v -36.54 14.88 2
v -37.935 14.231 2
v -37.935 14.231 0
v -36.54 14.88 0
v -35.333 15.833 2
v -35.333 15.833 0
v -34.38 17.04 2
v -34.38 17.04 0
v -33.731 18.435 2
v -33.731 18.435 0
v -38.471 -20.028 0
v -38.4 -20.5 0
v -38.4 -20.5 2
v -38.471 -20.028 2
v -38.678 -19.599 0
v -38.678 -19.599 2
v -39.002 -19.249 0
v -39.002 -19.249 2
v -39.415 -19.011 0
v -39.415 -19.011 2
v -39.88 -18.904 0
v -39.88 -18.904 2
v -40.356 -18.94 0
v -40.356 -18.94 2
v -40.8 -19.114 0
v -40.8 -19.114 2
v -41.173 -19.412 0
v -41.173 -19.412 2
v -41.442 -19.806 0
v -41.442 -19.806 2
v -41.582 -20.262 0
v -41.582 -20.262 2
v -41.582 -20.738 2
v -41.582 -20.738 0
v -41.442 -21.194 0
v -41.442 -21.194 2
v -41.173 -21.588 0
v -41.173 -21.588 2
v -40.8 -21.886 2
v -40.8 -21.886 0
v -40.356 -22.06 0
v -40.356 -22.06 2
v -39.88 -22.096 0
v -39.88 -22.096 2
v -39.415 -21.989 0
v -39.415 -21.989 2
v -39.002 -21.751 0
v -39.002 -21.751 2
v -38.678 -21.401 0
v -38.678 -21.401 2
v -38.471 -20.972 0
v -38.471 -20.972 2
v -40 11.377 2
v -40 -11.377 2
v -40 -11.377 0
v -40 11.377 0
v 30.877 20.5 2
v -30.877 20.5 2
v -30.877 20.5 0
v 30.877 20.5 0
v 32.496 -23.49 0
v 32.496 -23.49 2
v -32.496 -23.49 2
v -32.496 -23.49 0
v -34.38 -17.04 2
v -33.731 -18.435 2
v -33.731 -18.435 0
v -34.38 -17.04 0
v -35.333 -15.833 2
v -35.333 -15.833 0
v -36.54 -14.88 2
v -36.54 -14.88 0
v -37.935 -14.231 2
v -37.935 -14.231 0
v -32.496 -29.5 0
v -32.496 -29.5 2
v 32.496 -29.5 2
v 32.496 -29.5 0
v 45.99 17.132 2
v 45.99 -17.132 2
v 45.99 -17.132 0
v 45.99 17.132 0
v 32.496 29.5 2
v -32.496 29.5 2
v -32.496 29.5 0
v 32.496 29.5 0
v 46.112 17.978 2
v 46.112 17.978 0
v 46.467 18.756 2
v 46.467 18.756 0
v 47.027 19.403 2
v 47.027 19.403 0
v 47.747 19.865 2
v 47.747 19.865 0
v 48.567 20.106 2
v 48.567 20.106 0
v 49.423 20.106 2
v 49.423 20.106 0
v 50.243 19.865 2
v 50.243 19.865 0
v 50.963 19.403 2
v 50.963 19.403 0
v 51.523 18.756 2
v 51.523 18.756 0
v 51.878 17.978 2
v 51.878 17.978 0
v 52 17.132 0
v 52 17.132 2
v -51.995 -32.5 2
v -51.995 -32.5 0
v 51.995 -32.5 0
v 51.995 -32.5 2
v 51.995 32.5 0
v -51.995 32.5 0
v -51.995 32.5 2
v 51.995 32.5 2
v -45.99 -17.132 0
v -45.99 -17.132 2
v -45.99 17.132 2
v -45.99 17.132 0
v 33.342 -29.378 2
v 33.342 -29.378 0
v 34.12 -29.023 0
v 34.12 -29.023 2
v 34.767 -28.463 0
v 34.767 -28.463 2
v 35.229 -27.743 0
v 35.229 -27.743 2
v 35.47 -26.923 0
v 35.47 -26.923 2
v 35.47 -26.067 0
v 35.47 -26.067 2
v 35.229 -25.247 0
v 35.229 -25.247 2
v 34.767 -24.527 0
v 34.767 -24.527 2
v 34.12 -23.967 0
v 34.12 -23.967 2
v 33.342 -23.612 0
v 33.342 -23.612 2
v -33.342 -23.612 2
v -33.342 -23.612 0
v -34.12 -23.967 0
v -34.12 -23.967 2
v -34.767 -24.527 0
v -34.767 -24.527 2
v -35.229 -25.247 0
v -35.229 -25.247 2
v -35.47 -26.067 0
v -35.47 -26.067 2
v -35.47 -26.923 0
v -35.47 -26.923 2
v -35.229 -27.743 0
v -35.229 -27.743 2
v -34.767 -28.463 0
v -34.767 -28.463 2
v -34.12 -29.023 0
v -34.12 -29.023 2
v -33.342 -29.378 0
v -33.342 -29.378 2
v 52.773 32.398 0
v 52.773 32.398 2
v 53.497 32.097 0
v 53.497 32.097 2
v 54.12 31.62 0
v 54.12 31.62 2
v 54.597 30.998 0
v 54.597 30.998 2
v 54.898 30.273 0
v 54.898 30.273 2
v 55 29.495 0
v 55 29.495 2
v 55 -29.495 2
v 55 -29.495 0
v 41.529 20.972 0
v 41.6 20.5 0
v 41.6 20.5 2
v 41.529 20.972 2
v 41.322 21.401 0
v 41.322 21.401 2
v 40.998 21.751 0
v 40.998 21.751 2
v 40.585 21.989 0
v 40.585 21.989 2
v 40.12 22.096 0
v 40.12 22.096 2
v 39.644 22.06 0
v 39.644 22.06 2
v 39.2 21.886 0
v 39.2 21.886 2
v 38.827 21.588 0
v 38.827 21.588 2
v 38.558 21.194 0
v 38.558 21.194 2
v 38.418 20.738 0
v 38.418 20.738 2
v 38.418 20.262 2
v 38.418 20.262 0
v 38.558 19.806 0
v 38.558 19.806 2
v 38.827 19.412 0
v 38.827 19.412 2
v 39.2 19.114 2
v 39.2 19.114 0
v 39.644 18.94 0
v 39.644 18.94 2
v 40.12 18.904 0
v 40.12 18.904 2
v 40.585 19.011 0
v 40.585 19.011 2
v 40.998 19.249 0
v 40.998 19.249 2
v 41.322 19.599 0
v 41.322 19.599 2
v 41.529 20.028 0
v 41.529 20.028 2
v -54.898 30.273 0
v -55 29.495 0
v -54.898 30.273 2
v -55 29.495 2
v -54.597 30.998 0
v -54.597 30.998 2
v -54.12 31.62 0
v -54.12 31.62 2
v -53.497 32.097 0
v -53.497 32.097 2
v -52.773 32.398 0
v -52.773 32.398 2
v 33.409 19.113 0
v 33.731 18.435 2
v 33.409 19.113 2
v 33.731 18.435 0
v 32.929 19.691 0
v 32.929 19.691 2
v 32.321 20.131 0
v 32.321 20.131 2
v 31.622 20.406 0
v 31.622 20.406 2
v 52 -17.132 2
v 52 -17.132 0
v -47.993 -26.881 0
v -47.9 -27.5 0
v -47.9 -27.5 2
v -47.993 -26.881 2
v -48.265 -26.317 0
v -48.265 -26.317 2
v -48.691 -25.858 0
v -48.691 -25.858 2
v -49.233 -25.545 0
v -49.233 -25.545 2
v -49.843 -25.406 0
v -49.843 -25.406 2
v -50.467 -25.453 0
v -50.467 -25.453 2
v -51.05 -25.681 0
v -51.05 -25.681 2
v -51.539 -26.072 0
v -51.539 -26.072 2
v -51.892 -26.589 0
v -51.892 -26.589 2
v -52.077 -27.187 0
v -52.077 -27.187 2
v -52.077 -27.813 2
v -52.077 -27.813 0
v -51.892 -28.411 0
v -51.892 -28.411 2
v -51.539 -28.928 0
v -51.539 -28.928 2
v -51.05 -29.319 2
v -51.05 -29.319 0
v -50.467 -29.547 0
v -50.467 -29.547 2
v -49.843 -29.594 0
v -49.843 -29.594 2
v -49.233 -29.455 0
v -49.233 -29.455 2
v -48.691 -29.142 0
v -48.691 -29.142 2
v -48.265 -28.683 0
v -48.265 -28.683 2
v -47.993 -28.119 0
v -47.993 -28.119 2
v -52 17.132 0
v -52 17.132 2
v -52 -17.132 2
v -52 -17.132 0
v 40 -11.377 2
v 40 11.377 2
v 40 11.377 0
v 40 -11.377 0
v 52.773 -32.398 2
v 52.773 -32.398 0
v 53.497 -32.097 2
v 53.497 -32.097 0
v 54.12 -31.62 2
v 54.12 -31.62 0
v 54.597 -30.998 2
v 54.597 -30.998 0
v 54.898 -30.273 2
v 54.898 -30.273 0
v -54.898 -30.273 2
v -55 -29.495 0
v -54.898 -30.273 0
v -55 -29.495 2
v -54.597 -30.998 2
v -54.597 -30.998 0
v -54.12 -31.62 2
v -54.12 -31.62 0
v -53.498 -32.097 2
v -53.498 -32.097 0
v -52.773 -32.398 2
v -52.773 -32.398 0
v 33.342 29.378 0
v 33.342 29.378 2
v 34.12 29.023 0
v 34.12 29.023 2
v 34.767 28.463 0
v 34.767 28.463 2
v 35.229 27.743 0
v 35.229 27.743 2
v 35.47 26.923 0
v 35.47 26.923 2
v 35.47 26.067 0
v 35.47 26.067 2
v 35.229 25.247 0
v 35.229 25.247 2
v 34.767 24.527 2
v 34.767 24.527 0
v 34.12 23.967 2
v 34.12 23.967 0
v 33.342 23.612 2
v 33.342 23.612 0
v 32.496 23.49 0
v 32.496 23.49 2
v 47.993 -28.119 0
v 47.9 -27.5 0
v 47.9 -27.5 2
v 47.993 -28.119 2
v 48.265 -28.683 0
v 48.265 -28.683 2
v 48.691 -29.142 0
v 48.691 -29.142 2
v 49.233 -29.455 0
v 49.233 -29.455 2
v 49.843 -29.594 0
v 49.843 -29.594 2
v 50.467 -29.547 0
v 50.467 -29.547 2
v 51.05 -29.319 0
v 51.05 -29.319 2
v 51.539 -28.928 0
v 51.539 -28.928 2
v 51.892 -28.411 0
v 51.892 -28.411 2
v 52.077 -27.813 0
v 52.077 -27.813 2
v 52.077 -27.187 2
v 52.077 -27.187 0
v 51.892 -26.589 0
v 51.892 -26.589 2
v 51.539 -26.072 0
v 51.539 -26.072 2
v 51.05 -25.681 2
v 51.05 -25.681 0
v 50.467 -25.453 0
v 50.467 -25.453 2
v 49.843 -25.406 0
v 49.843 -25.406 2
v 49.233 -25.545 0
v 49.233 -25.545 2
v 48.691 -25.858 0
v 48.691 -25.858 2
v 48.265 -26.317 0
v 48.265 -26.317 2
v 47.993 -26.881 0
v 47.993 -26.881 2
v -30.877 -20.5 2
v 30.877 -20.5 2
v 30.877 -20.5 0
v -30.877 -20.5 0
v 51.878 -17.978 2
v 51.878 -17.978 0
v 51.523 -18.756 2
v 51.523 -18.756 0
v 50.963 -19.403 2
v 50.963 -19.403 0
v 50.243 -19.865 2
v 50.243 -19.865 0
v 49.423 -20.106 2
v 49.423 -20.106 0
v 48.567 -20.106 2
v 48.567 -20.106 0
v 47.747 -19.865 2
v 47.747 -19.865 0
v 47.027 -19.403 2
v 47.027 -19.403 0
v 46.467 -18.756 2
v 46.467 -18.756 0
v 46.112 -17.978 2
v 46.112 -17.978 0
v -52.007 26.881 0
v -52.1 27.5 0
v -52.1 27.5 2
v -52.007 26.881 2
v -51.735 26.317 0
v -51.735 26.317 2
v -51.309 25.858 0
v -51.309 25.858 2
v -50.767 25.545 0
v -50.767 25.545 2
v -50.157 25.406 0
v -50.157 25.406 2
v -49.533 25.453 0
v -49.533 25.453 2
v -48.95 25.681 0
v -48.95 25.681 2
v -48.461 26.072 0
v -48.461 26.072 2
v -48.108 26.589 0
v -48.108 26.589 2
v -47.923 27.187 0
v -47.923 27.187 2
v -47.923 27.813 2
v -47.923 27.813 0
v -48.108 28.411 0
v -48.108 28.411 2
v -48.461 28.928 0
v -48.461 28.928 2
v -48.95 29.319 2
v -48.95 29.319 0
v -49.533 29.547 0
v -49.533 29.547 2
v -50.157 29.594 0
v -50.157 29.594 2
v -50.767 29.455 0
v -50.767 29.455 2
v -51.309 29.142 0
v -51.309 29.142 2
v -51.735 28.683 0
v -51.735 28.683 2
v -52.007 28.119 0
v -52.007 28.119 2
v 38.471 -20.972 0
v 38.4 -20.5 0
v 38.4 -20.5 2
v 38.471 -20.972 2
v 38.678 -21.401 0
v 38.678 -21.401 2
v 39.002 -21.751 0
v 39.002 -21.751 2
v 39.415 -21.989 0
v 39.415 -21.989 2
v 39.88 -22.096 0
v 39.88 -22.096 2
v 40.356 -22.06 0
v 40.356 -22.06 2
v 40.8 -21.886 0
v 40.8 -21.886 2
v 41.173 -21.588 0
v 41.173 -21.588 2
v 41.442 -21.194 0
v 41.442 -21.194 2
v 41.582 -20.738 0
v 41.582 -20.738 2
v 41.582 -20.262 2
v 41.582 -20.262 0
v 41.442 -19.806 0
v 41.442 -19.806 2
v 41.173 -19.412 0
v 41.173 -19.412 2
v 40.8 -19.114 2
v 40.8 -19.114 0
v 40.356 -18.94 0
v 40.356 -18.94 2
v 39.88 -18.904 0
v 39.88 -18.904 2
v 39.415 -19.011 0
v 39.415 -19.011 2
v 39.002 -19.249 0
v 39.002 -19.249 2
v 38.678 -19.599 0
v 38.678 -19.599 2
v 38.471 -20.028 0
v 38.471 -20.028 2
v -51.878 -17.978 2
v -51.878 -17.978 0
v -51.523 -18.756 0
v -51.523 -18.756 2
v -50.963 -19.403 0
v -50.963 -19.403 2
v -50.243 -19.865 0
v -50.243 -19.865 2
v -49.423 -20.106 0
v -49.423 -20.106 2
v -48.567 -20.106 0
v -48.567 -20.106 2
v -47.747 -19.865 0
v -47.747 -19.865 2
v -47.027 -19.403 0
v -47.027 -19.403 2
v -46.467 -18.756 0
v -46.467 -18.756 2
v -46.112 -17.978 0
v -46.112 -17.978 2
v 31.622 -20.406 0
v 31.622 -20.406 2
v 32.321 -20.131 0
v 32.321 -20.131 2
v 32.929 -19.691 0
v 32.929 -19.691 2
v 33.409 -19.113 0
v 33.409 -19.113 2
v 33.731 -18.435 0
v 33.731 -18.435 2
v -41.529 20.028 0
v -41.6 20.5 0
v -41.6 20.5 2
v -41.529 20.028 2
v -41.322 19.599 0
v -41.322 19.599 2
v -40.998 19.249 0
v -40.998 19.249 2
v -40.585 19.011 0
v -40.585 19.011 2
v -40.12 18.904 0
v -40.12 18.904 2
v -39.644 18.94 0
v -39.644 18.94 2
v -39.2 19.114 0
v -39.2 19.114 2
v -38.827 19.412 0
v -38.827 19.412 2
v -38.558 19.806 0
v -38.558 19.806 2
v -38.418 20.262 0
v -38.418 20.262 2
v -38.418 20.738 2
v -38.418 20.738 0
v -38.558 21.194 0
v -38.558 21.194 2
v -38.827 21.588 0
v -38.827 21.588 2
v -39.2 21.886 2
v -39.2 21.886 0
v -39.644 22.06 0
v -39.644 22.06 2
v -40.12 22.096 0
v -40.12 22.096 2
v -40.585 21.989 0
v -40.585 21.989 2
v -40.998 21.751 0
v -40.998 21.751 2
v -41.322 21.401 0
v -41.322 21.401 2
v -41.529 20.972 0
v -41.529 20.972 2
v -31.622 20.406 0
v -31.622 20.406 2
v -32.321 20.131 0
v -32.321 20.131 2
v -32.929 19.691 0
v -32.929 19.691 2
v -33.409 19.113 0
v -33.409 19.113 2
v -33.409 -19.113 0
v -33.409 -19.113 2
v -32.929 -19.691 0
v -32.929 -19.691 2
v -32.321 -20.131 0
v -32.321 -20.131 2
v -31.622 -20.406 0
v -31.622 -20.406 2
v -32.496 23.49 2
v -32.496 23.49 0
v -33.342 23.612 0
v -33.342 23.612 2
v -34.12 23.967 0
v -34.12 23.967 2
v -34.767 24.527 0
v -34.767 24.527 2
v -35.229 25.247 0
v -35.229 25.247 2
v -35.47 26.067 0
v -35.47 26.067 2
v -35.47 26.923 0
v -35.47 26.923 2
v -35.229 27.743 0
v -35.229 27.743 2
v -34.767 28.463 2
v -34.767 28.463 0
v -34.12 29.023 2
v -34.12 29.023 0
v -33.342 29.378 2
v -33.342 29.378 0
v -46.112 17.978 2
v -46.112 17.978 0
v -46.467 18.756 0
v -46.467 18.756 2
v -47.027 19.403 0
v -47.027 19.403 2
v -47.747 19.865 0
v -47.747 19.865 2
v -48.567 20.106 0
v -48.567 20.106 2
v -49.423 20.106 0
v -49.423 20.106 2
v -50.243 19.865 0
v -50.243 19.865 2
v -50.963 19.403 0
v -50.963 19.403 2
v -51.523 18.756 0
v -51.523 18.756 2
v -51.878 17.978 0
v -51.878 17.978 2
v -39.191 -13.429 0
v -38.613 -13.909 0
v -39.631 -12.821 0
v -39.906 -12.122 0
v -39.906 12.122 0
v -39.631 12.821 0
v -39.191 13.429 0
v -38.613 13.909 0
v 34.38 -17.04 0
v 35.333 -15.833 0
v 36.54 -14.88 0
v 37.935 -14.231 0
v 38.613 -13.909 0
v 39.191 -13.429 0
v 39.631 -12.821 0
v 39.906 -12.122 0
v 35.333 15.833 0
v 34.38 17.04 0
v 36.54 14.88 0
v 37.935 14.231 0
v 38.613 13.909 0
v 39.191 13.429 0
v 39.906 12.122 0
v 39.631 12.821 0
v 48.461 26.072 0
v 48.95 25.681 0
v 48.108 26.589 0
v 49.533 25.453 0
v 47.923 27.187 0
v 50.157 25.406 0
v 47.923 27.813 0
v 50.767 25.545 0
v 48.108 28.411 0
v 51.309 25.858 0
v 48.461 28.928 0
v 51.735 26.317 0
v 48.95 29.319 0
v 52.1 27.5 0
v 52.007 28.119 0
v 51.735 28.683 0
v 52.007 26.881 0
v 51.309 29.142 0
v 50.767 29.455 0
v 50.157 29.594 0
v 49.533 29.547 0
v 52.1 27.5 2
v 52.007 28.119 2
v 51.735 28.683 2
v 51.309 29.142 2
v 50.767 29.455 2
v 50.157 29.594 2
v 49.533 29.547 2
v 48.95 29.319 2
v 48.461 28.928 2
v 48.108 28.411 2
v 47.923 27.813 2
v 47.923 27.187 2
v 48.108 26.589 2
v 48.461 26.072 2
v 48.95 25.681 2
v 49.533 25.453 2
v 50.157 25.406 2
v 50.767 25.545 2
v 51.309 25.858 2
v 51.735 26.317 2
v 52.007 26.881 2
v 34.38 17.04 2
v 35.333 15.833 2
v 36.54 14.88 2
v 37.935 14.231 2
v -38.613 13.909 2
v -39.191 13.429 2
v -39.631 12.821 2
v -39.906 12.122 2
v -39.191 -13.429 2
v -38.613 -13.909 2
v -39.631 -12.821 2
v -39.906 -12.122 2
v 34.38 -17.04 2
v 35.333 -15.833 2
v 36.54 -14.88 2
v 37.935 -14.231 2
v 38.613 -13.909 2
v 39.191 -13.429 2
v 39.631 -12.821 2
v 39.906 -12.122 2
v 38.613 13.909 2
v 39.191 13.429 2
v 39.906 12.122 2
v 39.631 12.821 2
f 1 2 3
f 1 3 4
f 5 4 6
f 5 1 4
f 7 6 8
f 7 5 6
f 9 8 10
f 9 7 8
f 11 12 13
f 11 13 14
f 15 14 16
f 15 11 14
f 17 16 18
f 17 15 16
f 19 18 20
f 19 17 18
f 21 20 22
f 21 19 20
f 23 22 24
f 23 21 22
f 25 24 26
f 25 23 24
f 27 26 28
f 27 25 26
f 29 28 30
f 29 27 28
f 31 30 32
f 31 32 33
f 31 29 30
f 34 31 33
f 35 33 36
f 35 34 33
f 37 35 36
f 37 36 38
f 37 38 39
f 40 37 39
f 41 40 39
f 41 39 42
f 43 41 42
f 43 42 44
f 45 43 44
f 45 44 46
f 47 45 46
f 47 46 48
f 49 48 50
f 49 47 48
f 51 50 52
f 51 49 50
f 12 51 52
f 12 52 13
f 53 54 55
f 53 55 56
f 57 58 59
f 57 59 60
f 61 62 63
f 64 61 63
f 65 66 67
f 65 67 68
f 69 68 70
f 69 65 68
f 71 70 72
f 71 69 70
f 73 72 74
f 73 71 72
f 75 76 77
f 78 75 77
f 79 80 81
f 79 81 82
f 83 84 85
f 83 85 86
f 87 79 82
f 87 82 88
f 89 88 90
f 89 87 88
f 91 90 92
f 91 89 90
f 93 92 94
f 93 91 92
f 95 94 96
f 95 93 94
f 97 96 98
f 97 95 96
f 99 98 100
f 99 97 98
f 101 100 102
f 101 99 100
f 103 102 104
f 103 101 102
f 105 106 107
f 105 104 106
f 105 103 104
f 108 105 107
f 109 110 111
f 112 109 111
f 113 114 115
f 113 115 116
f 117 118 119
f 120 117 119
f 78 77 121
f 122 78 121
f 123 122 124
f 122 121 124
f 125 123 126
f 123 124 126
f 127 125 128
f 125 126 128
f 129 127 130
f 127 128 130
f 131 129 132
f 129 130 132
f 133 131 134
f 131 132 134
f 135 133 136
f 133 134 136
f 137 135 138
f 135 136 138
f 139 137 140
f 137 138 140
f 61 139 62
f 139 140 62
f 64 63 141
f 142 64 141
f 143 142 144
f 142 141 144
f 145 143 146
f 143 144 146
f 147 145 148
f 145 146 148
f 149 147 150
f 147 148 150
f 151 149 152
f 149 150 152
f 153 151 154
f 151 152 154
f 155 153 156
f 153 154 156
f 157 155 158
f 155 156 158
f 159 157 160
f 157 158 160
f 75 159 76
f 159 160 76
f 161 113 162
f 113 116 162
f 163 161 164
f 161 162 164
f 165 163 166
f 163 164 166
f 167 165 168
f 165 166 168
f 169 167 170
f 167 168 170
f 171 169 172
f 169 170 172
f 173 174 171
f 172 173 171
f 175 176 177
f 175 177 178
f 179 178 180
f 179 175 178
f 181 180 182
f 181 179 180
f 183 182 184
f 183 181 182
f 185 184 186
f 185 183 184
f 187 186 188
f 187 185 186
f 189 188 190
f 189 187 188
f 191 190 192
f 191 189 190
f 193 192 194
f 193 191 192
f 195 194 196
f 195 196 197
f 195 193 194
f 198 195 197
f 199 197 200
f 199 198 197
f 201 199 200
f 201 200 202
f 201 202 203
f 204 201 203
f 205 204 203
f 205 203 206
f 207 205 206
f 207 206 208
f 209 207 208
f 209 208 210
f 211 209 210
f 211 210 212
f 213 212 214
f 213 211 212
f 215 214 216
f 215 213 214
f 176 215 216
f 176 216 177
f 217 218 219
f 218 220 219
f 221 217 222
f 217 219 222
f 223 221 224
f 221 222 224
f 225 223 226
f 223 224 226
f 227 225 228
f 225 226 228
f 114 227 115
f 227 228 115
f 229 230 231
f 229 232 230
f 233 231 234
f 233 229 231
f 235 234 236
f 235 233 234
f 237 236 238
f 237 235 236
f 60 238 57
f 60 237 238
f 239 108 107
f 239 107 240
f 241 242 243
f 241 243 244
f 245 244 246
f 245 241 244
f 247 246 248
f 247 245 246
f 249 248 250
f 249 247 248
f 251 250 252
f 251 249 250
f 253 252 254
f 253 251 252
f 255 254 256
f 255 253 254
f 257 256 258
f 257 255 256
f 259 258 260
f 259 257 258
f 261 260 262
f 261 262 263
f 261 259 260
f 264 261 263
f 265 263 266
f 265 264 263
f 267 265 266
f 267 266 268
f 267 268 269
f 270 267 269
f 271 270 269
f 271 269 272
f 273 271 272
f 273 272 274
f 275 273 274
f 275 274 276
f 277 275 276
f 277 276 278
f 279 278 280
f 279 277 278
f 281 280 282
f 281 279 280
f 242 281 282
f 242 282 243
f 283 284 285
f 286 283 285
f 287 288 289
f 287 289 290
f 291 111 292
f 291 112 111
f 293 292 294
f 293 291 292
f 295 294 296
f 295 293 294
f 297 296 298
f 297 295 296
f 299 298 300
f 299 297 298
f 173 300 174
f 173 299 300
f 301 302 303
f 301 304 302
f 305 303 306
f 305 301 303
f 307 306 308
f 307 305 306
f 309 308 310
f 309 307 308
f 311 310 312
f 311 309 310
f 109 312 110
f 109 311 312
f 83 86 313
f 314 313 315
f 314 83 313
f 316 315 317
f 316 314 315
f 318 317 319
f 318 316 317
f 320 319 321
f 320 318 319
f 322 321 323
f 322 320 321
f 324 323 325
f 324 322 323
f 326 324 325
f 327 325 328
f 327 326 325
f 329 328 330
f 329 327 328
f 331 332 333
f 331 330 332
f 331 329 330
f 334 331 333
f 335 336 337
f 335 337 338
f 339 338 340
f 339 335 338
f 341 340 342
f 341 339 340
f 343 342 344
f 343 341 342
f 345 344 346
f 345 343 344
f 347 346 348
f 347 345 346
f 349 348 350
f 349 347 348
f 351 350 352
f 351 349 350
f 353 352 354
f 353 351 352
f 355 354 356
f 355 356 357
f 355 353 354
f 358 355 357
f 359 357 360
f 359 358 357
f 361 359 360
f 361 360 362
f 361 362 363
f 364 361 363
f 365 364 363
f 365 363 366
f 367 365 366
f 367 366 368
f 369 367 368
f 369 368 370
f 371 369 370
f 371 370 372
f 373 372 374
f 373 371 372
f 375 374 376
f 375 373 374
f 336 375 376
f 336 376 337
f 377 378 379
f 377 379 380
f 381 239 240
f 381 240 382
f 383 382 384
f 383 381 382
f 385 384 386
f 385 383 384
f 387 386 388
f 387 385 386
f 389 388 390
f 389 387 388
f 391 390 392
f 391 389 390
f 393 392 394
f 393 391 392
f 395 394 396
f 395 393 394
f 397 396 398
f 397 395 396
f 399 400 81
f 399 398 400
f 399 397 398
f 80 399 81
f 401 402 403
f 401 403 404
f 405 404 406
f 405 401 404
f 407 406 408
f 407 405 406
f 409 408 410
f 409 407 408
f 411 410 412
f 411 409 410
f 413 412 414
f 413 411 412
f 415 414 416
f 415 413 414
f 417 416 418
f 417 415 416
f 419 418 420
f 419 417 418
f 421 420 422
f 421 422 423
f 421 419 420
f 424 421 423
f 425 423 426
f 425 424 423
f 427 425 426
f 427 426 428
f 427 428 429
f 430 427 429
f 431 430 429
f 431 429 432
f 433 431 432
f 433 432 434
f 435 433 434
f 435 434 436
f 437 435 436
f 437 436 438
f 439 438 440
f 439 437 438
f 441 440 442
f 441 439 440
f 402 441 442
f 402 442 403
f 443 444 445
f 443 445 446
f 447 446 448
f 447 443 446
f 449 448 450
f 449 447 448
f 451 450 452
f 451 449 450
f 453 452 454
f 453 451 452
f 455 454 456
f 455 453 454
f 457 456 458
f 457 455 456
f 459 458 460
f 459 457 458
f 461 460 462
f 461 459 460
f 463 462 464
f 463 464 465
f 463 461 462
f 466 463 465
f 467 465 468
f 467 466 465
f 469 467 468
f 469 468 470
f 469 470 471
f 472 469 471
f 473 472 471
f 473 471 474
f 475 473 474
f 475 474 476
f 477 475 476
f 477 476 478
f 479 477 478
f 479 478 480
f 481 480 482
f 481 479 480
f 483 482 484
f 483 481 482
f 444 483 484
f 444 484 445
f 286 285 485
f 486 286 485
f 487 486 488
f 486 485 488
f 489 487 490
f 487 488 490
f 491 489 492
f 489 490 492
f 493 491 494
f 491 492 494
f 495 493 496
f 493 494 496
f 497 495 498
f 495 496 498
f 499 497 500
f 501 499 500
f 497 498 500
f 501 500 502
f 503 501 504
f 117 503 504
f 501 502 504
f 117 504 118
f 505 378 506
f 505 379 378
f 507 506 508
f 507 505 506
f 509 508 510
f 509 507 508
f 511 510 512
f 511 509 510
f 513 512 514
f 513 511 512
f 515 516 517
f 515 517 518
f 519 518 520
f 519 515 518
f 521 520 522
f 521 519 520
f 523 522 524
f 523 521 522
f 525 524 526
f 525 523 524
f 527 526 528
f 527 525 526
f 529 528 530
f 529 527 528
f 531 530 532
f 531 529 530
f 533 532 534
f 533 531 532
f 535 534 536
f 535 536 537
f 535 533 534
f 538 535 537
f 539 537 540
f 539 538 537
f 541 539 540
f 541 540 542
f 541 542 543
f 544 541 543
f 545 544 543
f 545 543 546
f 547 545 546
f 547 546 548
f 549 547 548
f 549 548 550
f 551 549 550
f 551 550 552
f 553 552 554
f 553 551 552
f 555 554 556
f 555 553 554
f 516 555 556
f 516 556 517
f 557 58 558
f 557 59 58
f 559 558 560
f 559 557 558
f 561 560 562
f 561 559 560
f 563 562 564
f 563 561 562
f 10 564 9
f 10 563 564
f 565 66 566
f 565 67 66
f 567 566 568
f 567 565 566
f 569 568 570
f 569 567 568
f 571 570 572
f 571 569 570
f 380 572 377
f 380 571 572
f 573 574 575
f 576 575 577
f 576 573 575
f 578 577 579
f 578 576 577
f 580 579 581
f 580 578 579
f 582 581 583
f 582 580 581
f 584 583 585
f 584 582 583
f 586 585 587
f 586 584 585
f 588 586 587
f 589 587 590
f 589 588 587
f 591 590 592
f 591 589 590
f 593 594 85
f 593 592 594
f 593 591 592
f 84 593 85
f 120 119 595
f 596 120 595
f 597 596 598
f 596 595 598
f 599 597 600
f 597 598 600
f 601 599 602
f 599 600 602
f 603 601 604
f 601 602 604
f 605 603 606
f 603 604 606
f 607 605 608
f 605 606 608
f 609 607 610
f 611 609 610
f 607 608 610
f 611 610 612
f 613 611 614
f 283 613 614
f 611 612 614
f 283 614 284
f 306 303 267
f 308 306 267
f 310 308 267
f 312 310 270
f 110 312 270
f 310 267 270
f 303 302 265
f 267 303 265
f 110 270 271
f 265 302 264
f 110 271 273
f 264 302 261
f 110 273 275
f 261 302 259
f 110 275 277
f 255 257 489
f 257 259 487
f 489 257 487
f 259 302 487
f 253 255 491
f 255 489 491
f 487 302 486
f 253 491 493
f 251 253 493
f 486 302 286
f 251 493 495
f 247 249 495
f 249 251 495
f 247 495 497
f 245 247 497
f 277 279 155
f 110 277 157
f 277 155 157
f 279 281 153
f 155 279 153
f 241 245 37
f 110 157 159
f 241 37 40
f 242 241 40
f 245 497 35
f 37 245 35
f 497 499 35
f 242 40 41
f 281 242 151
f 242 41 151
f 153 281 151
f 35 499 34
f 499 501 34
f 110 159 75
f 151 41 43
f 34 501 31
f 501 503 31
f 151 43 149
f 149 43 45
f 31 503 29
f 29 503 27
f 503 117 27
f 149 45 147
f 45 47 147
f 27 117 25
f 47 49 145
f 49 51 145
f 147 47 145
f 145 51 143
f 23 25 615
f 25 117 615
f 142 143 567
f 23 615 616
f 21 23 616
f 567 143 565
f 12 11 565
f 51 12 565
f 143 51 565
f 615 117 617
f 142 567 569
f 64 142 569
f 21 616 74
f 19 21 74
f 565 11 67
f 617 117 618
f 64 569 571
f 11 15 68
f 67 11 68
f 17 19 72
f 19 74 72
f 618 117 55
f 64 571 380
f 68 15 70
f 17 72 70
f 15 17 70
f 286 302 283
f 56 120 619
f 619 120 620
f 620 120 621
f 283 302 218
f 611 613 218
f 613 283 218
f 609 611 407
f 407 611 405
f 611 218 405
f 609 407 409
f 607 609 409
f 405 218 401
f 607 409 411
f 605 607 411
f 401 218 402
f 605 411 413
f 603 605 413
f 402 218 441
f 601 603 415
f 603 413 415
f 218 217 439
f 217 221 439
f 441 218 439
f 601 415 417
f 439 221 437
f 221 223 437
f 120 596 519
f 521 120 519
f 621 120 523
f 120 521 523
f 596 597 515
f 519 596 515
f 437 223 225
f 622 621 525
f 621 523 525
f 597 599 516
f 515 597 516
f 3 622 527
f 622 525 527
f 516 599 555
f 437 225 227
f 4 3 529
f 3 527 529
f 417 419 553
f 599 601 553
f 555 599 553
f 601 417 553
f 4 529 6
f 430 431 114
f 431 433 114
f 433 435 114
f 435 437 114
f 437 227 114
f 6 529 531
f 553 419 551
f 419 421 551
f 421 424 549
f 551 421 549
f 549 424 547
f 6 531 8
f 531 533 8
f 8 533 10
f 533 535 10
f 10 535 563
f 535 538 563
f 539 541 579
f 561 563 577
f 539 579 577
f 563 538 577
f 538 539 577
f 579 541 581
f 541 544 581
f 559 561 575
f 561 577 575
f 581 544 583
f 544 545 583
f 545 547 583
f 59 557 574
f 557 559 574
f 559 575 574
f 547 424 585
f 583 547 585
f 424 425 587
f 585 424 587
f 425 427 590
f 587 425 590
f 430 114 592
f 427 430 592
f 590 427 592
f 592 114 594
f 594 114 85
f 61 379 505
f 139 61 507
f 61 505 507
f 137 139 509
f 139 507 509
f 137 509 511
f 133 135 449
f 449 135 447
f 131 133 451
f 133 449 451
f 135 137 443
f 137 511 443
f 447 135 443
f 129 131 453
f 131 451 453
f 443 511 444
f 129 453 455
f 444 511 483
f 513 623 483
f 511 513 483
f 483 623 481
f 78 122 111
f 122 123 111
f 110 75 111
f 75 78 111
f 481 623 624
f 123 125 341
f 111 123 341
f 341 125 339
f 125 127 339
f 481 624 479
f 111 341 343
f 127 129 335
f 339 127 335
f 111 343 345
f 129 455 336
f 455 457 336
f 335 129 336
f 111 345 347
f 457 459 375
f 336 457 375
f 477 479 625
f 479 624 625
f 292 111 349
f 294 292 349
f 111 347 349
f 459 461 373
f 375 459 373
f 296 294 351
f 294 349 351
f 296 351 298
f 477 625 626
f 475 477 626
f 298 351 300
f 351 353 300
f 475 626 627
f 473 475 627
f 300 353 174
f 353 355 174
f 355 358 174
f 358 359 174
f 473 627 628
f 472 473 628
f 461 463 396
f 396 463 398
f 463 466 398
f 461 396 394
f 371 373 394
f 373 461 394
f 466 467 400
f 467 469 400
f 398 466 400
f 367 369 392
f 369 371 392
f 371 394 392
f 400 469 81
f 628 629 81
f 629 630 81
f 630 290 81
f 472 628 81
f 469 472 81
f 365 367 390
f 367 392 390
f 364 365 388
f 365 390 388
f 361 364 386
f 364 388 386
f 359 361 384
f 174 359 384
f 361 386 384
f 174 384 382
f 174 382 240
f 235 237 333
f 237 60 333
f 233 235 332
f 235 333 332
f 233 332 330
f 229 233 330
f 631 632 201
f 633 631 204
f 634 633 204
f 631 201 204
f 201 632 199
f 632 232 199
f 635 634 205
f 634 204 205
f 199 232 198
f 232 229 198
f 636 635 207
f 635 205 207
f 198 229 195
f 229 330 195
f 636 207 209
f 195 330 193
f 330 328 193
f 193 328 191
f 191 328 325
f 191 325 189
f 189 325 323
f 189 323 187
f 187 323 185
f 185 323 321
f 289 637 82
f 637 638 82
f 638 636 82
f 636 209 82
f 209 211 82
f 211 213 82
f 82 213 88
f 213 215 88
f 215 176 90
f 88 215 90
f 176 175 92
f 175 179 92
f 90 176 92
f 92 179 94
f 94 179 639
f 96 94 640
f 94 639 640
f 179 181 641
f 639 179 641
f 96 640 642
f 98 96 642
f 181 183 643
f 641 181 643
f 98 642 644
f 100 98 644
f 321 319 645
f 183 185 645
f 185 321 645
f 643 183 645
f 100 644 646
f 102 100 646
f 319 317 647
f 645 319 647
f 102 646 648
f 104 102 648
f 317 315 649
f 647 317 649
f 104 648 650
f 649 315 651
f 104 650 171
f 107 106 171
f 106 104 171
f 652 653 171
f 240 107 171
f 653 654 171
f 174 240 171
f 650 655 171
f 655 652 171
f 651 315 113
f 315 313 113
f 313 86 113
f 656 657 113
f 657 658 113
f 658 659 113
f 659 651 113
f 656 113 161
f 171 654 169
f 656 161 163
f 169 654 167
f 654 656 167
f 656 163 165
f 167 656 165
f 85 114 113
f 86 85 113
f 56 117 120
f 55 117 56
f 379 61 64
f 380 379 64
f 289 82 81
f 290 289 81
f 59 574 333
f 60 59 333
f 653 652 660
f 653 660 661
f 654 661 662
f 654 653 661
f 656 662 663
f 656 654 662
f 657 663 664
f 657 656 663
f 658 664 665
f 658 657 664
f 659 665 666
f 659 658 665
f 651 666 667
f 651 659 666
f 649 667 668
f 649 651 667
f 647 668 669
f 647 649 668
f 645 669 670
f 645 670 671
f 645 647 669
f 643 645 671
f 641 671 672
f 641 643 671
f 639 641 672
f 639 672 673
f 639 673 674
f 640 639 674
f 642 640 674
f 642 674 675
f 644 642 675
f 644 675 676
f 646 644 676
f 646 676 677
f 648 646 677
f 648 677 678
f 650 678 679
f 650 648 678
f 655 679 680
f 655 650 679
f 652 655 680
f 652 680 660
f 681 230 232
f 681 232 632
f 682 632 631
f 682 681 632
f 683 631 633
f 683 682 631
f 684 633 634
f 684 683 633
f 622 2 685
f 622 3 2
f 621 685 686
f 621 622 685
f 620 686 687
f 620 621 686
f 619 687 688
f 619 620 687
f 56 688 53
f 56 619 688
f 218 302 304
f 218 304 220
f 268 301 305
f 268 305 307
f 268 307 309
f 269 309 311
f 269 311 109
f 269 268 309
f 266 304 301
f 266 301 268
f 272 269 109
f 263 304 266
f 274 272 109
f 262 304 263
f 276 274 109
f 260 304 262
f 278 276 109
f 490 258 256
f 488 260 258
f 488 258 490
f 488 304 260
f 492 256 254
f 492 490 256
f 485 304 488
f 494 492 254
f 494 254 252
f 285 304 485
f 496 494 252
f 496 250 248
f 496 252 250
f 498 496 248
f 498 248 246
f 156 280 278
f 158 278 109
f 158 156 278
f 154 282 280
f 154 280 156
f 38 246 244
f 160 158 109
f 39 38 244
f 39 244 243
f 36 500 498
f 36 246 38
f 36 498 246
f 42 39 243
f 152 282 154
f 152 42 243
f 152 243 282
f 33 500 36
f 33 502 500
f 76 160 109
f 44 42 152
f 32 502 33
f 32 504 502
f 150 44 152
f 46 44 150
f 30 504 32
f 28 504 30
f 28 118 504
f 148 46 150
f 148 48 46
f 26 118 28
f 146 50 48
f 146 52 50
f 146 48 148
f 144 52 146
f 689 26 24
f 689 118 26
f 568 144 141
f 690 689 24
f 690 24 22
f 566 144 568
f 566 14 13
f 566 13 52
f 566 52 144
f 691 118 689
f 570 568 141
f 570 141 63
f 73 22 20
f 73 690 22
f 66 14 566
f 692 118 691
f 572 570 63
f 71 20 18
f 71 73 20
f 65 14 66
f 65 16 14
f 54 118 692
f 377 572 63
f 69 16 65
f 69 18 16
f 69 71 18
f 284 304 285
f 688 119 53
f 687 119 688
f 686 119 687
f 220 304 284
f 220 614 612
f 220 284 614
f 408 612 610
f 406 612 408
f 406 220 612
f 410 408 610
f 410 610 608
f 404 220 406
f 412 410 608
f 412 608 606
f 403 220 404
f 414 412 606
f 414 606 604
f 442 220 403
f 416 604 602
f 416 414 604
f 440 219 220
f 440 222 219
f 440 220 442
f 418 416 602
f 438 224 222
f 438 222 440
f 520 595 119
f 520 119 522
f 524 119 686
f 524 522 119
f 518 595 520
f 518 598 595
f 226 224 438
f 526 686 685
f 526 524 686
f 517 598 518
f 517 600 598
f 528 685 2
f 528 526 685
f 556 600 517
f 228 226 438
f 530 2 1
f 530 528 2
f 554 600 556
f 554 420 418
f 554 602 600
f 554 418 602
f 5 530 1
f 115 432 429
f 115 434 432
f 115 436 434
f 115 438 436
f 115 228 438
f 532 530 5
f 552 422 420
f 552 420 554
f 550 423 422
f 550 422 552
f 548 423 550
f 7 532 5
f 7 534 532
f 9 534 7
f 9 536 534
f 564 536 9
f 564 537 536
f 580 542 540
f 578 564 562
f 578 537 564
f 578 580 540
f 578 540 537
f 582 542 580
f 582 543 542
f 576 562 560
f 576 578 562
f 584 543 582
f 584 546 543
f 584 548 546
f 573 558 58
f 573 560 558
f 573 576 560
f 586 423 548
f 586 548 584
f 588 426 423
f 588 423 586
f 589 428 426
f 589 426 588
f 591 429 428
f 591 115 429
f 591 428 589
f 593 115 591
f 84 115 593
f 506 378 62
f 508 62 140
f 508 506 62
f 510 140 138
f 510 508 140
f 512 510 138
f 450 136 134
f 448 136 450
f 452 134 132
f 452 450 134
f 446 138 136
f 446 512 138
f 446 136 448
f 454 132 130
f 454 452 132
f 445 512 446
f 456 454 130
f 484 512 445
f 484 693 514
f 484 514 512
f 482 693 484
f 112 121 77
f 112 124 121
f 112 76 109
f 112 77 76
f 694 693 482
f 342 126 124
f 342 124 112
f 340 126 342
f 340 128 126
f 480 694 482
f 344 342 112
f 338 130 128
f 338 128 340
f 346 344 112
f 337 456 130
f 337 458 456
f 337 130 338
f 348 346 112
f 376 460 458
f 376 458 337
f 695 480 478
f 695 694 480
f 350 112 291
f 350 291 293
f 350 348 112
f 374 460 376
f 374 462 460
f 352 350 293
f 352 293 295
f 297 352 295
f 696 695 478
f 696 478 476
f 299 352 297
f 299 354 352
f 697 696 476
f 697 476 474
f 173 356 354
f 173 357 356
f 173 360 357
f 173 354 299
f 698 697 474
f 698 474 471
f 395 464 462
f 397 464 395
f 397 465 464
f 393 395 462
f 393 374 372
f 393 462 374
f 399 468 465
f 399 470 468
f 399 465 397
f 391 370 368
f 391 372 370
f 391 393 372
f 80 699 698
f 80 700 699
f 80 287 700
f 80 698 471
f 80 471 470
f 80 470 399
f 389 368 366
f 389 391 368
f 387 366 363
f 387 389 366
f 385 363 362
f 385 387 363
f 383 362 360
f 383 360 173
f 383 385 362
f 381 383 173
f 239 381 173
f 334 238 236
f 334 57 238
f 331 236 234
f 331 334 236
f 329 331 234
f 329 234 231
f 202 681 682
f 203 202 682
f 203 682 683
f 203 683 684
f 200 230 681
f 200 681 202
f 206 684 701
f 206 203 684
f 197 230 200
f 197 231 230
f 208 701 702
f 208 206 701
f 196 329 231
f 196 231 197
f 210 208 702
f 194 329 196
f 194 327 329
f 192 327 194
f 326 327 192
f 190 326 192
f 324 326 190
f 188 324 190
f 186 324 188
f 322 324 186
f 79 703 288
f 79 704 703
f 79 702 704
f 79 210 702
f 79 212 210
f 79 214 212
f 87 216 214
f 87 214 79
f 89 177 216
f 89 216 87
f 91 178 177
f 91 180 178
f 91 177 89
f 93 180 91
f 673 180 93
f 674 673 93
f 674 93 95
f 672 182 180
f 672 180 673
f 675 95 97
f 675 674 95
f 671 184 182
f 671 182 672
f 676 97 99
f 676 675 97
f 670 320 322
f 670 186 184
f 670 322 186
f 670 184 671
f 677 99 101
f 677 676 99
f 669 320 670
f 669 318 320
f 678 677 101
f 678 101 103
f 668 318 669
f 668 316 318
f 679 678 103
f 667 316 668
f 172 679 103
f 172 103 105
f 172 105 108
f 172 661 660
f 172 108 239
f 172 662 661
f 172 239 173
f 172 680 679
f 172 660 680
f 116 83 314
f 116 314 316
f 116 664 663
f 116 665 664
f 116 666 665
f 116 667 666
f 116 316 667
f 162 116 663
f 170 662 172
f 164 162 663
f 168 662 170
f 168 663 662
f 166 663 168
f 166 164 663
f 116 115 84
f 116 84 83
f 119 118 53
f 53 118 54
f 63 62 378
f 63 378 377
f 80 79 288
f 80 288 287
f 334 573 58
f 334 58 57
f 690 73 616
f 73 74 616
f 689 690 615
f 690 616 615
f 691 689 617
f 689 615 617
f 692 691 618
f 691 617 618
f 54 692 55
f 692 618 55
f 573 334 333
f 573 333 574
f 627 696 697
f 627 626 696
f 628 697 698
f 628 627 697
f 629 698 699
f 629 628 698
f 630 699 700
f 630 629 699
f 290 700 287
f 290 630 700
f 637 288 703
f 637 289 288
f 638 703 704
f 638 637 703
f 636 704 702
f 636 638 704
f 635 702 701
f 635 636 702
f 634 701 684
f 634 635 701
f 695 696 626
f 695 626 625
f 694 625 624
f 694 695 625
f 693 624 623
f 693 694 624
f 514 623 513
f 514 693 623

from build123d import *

# Parameters (mm, degrees)
SKETCH_1_W          = 110
SKETCH_1_H          = 65
SKETCH_1_R          = 1.6
SKETCH_1_R_2        = 2.1
EXTRUDE_1_DEPTH     = 2
CUT_EXTRUDE_1_DEPTH = 64.915960448
FILLET_1_R          = 3.005


with BuildPart() as part:
    # ｽｹｯﾁ1 → ﾎﾞｽ - 押し出し1 (new body)
    with BuildSketch(Plane.XY):
        Rectangle(SKETCH_1_W, SKETCH_1_H)
        with Locations((40, 20.5)):
            Circle(SKETCH_1_R, mode=Mode.SUBTRACT)
        with Locations(Location((-40, 20.5, 0), (0, 0, 180))):
            Circle(SKETCH_1_R, mode=Mode.SUBTRACT)
        with Locations((-40, -20.5)):
            Circle(SKETCH_1_R, mode=Mode.SUBTRACT)
        with Locations(Location((40, -20.5, 0), (0, 0, 180))):
            Circle(SKETCH_1_R, mode=Mode.SUBTRACT)
        with Locations((50, 27.5)):
            Circle(SKETCH_1_R_2, mode=Mode.SUBTRACT)
        with Locations(Location((50, -27.5, 0), (0, 0, 180))):
            Circle(SKETCH_1_R_2, mode=Mode.SUBTRACT)
        with Locations(Location((-50, 27.5, 0), (0, 0, 180))):
            Circle(SKETCH_1_R_2, mode=Mode.SUBTRACT)
        with Locations((-50, -27.5)):
            Circle(SKETCH_1_R_2, mode=Mode.SUBTRACT)
    extrude(amount=EXTRUDE_1_DEPTH)

    # ｽｹｯﾁ3 → ｶｯﾄ - 押し出し1 (cut, through all)
    with BuildSketch(Plane.XY.offset(2)):
        with BuildLine():
            Line((-40, -13.9), (-40, 13.9))
            ThreePointArc((-40, 13.9), (-35.333095244, 15.833095244), (-33.4, 20.5))
            Line((-33.4, 20.5), (33.4, 20.5))
            ThreePointArc((33.4, 20.5), (35.333095244, 15.833095244), (40, 13.9))
            Line((40, 13.9), (40, -13.9))
            ThreePointArc((40, -13.9), (35.333095244, -15.833095244), (33.4, -20.5))
            Line((33.4, -20.5), (-33.4, -20.5))
            ThreePointArc((-33.4, -20.5), (-35.333095244, -15.833095244), (-40, -13.9))
        make_face()
        with BuildLine():
            Line((-32.49560129, 29.5), (32.49560129, 29.5))
            ThreePointArc((32.49560129, 29.5), (35.50060129, 26.495), (32.49560129, 23.49))
            Line((32.49560129, 23.49), (-32.49560129, 23.49))
            ThreePointArc((-32.49560129, 23.49), (-35.50060129, 26.495), (-32.49560129, 29.5))
        make_face()
        with BuildLine():
            Line((-32.49560129, -29.5), (32.49560129, -29.5))
            ThreePointArc((32.49560129, -29.5), (35.50060129, -26.495), (32.49560129, -23.49))
            Line((32.49560129, -23.49), (-32.49560129, -23.49))
            ThreePointArc((-32.49560129, -23.49), (-35.50060129, -26.495), (-32.49560129, -29.5))
        make_face()
        with BuildLine():
            Line((52, 17.131617599), (52, -17.131617599))
            ThreePointArc((52, -17.131617599), (48.995, -20.136617599), (45.99, -17.131617599))
            Line((45.99, -17.131617599), (45.99, 17.131617599))
            ThreePointArc((45.99, 17.131617599), (48.995, 20.136617599), (52, 17.131617599))
        make_face()
        with BuildLine():
            Line((-52, 17.131617599), (-52, -17.131617599))
            ThreePointArc((-52, -17.131617599), (-48.995, -20.136617599), (-45.99, -17.131617599))
            Line((-45.99, -17.131617599), (-45.99, 17.131617599))
            ThreePointArc((-45.99, 17.131617599), (-48.995, 20.136617599), (-52, 17.131617599))
        make_face()
    extrude(amount=-CUT_EXTRUDE_1_DEPTH, mode=Mode.SUBTRACT)

    # ﾌｨﾚｯﾄ1
    fillet_1_edges = [part.edges().sort_by_distance(p)[0] for p in [
        (55, -32.5, 1),
        (-55, -32.5, 1),
        (-55, 32.5, 1),
        (55, 32.5, 1),
        (-33.4, -20.5, 1),
        (-40, -13.9, 1),
        (-40, 13.9, 1),
        (-33.4, 20.5, 1),
        (33.4, 20.5, 1),
        (40, 13.9, 1),
        (40, -13.9, 1),
        (33.4, -20.5, 1),
    ]]
    fillet(fillet_1_edges, radius=FILLET_1_R)


solid = part.part
